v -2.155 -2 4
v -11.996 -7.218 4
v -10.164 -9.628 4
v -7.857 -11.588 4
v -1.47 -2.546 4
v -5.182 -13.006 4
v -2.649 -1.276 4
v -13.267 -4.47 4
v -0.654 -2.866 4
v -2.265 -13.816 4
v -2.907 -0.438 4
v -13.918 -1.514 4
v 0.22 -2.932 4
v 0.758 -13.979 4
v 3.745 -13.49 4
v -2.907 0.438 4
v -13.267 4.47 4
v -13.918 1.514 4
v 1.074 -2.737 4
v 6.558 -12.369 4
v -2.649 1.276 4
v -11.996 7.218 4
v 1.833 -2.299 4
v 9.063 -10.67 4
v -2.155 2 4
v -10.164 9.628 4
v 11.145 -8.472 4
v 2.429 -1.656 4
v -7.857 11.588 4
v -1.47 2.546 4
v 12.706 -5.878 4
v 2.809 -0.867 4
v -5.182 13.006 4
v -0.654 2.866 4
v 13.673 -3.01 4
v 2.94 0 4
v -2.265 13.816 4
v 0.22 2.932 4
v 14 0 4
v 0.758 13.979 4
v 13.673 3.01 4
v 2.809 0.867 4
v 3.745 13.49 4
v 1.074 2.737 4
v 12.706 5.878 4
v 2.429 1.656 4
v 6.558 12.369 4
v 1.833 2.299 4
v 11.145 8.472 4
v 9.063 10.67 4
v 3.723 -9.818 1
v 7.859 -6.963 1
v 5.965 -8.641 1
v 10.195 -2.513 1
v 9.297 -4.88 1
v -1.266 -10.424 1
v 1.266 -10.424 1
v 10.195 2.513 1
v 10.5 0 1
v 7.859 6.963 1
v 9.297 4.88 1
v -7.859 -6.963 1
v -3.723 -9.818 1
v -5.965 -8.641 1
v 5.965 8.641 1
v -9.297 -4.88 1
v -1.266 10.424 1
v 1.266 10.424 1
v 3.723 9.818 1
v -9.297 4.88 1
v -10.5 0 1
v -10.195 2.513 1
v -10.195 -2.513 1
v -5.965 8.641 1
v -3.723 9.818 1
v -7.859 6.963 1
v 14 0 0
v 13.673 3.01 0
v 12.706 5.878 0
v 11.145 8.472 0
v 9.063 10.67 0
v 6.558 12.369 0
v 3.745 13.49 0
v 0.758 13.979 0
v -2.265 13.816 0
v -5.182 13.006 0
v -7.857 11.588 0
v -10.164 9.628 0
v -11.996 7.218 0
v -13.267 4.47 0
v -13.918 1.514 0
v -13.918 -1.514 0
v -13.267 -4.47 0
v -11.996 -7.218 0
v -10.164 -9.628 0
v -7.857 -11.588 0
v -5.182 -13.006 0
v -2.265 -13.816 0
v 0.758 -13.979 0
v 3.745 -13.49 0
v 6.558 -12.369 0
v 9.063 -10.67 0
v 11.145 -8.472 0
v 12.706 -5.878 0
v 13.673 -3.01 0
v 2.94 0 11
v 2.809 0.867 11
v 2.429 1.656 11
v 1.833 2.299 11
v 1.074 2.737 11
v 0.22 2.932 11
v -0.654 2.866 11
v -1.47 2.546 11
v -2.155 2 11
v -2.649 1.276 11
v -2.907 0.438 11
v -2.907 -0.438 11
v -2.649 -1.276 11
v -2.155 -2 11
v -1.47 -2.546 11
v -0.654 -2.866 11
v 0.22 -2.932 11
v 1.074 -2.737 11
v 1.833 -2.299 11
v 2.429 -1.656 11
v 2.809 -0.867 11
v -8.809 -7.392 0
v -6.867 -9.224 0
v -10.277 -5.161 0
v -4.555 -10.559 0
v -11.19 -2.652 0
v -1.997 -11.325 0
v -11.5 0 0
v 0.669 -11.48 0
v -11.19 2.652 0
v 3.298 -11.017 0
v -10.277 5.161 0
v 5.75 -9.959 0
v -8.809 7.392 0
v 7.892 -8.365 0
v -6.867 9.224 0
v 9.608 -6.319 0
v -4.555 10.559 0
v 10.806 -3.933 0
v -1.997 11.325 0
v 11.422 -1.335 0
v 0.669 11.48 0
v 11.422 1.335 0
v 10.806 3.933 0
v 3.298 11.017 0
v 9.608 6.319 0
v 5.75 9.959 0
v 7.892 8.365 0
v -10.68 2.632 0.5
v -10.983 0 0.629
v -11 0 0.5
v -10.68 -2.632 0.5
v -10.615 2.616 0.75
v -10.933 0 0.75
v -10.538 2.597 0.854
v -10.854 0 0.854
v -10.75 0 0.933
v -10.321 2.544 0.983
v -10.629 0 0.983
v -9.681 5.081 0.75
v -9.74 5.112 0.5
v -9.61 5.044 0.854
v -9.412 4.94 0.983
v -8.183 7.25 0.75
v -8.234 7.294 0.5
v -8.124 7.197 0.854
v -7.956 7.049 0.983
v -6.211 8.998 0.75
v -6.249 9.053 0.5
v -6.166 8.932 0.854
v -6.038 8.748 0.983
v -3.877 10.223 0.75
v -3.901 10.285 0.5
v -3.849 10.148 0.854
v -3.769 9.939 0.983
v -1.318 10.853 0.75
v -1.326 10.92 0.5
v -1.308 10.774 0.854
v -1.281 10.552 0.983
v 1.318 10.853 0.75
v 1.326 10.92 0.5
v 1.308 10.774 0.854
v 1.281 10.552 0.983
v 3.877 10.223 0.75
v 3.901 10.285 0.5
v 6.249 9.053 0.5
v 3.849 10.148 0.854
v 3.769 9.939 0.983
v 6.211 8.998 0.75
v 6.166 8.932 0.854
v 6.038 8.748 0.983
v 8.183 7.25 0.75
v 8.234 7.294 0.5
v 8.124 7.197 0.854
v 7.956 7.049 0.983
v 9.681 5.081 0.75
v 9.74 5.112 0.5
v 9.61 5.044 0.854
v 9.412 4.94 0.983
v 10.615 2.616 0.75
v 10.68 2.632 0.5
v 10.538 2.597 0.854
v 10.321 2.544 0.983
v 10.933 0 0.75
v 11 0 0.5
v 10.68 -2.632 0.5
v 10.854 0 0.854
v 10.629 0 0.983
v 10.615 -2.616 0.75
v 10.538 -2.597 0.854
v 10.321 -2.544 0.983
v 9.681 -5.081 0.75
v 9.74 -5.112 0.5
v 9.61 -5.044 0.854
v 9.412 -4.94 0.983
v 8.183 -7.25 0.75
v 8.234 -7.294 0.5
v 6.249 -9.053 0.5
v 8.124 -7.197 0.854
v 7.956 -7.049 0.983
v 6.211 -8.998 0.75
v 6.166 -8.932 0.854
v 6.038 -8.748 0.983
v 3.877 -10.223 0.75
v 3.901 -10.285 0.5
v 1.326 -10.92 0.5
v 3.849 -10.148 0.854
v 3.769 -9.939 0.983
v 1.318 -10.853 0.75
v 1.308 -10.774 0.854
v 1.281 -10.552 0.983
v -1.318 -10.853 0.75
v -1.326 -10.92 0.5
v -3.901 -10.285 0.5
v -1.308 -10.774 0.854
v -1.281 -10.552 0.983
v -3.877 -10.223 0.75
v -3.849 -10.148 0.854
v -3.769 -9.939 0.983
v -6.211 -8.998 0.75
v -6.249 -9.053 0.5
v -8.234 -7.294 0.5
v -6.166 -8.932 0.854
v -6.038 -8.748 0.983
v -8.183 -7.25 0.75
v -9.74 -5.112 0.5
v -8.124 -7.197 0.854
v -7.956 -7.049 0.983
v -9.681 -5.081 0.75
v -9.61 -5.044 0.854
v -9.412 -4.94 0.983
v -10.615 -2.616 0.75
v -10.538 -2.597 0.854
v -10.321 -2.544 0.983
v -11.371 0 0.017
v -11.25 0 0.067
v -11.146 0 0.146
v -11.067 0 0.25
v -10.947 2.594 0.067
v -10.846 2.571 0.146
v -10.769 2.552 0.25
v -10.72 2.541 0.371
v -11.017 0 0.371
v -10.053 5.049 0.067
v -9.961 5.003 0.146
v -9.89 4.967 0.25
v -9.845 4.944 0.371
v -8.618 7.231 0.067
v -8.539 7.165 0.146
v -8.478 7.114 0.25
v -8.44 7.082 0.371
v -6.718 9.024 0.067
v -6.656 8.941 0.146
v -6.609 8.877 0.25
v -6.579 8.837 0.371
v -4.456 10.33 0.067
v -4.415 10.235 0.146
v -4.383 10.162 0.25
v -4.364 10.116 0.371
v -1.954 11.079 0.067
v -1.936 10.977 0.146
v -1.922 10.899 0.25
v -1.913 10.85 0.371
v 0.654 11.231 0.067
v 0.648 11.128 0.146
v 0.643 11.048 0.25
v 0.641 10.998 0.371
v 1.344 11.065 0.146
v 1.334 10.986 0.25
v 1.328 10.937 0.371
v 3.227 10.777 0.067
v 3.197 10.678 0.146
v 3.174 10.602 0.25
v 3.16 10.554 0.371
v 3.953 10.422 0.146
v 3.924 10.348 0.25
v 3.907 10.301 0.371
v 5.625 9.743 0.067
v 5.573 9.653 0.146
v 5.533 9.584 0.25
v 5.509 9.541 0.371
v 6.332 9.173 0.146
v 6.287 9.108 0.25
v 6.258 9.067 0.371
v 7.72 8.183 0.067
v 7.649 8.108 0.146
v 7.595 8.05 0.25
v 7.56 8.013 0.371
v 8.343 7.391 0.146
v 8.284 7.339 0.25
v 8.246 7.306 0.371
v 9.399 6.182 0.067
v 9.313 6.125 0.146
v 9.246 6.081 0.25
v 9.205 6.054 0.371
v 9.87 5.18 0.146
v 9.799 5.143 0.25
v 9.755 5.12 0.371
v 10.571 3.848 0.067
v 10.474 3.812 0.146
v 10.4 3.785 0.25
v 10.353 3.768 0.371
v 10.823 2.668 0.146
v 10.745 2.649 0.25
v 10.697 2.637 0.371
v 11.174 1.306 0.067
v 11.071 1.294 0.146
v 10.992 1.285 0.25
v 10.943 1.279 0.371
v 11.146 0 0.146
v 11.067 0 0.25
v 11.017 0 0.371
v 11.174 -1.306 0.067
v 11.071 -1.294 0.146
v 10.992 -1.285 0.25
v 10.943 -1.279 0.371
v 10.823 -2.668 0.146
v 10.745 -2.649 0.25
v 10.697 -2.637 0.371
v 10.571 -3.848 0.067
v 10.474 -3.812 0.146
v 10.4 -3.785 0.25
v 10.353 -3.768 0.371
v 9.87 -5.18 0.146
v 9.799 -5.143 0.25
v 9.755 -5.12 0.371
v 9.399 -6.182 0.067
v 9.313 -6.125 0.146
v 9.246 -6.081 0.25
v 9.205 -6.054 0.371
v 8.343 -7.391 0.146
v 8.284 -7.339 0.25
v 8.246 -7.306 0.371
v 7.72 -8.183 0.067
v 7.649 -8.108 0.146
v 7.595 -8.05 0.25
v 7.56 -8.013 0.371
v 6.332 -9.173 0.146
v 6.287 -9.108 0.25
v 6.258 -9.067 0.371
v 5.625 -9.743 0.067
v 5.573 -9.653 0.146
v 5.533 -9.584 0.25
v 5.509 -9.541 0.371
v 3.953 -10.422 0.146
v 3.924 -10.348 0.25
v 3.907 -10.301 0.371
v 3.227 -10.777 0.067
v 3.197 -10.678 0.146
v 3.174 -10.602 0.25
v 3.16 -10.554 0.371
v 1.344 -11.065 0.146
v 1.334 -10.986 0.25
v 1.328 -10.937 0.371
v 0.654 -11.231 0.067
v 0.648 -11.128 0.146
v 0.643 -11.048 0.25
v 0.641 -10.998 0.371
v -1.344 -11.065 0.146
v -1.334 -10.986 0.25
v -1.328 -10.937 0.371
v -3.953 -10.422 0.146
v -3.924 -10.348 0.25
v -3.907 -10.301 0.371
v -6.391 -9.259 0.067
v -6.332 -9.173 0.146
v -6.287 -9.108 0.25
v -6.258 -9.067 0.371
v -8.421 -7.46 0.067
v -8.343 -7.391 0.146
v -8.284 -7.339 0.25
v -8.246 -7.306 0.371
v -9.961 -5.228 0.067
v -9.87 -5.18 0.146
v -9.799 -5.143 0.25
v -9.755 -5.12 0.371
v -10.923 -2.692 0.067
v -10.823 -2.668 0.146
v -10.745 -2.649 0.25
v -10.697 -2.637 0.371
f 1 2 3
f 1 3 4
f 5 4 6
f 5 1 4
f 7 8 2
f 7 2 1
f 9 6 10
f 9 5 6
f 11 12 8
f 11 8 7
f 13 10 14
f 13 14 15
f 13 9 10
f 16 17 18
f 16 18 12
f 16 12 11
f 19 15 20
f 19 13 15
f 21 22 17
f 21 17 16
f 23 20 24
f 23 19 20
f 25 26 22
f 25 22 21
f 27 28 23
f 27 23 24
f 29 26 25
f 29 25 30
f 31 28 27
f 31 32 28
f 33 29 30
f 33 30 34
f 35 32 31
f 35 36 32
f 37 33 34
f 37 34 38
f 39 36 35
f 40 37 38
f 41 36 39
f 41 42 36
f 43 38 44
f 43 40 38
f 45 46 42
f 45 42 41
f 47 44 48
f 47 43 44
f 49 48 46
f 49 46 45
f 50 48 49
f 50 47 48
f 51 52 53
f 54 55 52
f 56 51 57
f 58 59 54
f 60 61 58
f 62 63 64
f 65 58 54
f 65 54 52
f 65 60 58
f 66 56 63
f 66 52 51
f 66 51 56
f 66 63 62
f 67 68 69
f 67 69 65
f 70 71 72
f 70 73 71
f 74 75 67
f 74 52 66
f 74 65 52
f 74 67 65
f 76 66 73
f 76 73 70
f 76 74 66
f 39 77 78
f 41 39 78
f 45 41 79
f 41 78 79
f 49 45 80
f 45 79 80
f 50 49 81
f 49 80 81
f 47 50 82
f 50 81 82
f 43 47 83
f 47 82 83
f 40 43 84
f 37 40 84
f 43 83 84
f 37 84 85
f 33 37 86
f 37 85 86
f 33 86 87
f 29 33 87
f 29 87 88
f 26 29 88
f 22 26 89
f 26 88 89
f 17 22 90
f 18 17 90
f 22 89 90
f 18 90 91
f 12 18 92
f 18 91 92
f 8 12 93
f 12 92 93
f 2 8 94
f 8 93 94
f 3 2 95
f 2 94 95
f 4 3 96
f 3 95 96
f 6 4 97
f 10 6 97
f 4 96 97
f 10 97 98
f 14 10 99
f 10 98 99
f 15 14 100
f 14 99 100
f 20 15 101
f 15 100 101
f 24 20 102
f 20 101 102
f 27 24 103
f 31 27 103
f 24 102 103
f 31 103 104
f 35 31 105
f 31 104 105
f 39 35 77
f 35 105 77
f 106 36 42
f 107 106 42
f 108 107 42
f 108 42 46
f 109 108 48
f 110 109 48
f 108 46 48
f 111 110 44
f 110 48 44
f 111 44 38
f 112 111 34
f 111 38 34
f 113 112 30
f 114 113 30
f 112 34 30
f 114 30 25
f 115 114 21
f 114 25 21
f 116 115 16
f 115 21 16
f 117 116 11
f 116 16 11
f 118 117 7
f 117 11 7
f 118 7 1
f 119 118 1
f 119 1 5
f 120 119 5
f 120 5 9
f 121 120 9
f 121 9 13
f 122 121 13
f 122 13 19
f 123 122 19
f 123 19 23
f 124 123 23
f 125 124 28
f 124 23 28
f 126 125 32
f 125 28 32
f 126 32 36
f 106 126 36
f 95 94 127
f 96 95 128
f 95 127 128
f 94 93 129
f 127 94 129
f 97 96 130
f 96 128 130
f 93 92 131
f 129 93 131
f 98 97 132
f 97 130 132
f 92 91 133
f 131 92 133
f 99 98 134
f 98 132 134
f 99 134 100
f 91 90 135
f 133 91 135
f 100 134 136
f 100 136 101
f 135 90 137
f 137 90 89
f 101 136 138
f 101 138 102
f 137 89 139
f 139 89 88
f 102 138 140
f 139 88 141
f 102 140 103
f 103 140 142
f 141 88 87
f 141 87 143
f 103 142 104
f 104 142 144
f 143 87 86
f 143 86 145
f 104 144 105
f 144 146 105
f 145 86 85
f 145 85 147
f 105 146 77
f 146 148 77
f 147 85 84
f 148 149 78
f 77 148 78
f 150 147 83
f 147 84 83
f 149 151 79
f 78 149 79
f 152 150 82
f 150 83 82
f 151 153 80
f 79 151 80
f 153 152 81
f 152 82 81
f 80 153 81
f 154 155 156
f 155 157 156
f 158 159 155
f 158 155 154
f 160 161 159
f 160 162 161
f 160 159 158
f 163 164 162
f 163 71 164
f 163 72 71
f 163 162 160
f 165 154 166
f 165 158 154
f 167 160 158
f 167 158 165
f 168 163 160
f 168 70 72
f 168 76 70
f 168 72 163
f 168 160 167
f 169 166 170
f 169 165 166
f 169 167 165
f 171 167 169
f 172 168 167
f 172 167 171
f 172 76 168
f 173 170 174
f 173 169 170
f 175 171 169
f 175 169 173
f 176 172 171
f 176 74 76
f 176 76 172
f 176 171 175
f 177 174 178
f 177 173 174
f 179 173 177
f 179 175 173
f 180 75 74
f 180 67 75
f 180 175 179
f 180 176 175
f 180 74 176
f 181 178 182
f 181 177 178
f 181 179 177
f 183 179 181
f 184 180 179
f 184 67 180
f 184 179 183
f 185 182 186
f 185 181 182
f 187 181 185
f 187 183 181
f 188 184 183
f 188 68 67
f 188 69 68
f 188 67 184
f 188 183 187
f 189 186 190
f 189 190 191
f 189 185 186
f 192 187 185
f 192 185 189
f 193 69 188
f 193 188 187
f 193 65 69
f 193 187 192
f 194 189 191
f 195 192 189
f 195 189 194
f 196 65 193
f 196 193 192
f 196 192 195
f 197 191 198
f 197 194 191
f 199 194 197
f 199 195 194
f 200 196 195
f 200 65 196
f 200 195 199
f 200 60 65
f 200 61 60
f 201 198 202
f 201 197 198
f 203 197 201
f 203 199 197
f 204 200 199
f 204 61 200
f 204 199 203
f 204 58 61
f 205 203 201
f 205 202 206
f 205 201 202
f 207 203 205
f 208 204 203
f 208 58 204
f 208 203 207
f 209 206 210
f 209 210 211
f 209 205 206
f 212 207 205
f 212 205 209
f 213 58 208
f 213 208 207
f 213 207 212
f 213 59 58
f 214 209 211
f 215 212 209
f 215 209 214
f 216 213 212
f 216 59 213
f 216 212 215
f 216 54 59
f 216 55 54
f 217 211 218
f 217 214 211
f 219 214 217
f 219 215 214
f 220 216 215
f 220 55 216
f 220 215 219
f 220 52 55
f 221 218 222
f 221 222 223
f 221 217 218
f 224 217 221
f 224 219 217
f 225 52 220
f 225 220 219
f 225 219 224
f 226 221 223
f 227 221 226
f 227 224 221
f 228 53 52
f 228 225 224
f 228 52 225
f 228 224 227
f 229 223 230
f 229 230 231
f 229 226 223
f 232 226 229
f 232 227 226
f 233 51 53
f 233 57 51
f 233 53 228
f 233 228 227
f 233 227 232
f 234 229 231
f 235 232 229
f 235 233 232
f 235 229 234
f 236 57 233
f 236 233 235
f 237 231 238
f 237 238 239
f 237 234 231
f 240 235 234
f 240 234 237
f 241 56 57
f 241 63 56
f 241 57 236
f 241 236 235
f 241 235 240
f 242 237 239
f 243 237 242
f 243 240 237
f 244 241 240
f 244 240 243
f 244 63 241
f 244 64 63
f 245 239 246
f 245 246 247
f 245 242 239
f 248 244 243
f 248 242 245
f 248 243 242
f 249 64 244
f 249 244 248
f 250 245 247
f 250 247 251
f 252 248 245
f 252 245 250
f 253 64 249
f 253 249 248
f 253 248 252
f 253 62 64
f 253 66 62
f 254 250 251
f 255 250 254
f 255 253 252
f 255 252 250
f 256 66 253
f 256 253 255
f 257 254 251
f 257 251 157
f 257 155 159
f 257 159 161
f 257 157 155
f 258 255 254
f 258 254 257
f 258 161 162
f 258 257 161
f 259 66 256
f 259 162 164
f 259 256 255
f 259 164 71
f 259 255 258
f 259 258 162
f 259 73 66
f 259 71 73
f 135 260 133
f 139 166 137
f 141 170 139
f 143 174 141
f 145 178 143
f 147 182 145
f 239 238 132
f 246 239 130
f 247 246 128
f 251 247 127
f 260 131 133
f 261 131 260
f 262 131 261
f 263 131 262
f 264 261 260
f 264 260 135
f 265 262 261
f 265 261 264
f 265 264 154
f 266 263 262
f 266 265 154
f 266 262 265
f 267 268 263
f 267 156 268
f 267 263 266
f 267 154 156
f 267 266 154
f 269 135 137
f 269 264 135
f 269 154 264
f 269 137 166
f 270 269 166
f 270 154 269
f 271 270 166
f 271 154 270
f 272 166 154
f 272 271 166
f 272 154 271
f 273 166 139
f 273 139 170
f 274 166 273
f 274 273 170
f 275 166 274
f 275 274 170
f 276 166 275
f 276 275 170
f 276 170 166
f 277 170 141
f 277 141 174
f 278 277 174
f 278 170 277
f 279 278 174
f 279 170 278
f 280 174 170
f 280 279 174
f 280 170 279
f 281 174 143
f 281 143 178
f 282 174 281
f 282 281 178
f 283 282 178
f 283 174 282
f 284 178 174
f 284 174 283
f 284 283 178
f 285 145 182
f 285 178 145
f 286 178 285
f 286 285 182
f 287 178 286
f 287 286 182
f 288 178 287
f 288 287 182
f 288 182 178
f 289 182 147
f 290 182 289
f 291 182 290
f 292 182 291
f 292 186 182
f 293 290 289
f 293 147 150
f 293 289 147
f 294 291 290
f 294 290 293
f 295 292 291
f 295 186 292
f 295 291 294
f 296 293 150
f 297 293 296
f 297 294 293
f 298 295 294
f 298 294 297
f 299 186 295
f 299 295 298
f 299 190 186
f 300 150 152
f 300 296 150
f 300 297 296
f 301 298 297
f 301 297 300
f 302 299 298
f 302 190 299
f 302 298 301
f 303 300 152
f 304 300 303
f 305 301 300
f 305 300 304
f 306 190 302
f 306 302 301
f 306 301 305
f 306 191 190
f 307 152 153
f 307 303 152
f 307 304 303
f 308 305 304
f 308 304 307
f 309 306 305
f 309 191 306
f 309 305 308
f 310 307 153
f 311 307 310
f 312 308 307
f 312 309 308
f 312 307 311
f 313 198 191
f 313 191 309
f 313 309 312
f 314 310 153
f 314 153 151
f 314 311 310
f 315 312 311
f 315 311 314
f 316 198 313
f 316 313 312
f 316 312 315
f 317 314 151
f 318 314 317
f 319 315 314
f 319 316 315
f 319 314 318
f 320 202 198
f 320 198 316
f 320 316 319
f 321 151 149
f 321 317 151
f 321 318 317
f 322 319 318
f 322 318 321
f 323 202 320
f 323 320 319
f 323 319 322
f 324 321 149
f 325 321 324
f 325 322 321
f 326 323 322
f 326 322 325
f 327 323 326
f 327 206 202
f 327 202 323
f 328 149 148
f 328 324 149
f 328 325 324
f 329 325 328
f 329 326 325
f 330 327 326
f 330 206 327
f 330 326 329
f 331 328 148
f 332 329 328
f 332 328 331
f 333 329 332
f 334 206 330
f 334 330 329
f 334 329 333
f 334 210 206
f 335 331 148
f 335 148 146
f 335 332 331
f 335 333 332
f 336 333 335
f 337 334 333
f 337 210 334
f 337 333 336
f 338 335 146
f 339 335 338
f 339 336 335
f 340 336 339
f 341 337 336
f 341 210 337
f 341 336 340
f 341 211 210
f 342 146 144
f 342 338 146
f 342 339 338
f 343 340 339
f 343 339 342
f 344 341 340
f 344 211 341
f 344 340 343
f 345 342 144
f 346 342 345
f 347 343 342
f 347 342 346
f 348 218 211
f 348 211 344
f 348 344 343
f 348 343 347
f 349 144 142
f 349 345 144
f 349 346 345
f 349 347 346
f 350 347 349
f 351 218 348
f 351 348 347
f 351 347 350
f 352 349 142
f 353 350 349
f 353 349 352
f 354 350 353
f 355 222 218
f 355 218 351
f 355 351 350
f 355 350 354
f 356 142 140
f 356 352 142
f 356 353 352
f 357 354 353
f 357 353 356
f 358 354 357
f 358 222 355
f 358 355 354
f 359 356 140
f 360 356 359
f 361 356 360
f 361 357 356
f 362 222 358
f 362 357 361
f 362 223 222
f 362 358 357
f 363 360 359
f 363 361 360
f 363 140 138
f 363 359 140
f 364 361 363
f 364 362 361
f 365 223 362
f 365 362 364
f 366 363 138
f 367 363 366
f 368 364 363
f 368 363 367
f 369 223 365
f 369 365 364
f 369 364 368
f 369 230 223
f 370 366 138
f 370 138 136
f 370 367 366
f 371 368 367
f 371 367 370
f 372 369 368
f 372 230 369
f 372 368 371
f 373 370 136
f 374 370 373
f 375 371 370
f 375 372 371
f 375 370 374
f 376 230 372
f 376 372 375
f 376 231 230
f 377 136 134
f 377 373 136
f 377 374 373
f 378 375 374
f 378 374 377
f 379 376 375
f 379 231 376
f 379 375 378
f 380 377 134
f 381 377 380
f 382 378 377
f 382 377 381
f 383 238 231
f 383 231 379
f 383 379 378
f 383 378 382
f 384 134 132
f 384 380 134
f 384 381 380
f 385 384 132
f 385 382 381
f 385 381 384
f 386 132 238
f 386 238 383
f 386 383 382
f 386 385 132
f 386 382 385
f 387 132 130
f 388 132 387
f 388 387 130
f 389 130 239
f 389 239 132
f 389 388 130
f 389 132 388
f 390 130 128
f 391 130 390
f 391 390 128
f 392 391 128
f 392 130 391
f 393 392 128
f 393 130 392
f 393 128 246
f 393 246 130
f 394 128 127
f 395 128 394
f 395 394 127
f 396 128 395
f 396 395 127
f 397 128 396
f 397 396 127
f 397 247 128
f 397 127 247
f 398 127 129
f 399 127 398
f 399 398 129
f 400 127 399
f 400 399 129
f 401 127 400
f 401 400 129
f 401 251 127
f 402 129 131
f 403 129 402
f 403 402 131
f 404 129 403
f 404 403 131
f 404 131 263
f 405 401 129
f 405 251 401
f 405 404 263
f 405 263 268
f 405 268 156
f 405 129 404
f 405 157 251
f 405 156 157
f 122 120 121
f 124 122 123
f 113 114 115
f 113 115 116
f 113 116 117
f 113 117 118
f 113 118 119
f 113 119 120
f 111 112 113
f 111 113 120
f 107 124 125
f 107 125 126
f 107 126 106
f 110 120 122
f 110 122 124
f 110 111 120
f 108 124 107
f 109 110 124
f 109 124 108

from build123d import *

# Parameters (mm, degrees)
SKETCH1_R           = 14
BOSS_EXTRUDE1_DEPTH = 4
SKETCH2_R           = 2.94
BOSS_EXTRUDE2_DEPTH = 7
SKETCH4_R           = 11
CUT_EXTRUDE1_DEPTH  = 1
FILLET1_R           = 0.5


with BuildPart() as part:
    # Sketch1 → Boss-Extrude1 (new body)
    with BuildSketch(Plane.XY):
        Circle(SKETCH1_R)
    extrude(amount=BOSS_EXTRUDE1_DEPTH)

    # Sketch2 → Boss-Extrude2 (add)
    with BuildSketch(Plane.XY.offset(4)):
        Circle(SKETCH2_R)
    extrude(amount=BOSS_EXTRUDE2_DEPTH)

    # Sketch4 → Cut-Extrude1 (cut)
    with BuildSketch(Plane(origin=(0, 0, 0), x_dir=(-1, 0, 0), z_dir=(0, 0, -1))):
        Circle(SKETCH4_R)
    extrude(amount=-CUT_EXTRUDE1_DEPTH, mode=Mode.SUBTRACT)

    # Fillet1
    fillet1_edges = [part.edges().sort_by_distance(p)[0] for p in [
        (11, 0, 1),
        (11, 0, 0),
    ]]
    fillet(fillet1_edges, radius=FILLET1_R - 0.0001)  # a hair under: the kernel refuses the full size


solid = part.part
